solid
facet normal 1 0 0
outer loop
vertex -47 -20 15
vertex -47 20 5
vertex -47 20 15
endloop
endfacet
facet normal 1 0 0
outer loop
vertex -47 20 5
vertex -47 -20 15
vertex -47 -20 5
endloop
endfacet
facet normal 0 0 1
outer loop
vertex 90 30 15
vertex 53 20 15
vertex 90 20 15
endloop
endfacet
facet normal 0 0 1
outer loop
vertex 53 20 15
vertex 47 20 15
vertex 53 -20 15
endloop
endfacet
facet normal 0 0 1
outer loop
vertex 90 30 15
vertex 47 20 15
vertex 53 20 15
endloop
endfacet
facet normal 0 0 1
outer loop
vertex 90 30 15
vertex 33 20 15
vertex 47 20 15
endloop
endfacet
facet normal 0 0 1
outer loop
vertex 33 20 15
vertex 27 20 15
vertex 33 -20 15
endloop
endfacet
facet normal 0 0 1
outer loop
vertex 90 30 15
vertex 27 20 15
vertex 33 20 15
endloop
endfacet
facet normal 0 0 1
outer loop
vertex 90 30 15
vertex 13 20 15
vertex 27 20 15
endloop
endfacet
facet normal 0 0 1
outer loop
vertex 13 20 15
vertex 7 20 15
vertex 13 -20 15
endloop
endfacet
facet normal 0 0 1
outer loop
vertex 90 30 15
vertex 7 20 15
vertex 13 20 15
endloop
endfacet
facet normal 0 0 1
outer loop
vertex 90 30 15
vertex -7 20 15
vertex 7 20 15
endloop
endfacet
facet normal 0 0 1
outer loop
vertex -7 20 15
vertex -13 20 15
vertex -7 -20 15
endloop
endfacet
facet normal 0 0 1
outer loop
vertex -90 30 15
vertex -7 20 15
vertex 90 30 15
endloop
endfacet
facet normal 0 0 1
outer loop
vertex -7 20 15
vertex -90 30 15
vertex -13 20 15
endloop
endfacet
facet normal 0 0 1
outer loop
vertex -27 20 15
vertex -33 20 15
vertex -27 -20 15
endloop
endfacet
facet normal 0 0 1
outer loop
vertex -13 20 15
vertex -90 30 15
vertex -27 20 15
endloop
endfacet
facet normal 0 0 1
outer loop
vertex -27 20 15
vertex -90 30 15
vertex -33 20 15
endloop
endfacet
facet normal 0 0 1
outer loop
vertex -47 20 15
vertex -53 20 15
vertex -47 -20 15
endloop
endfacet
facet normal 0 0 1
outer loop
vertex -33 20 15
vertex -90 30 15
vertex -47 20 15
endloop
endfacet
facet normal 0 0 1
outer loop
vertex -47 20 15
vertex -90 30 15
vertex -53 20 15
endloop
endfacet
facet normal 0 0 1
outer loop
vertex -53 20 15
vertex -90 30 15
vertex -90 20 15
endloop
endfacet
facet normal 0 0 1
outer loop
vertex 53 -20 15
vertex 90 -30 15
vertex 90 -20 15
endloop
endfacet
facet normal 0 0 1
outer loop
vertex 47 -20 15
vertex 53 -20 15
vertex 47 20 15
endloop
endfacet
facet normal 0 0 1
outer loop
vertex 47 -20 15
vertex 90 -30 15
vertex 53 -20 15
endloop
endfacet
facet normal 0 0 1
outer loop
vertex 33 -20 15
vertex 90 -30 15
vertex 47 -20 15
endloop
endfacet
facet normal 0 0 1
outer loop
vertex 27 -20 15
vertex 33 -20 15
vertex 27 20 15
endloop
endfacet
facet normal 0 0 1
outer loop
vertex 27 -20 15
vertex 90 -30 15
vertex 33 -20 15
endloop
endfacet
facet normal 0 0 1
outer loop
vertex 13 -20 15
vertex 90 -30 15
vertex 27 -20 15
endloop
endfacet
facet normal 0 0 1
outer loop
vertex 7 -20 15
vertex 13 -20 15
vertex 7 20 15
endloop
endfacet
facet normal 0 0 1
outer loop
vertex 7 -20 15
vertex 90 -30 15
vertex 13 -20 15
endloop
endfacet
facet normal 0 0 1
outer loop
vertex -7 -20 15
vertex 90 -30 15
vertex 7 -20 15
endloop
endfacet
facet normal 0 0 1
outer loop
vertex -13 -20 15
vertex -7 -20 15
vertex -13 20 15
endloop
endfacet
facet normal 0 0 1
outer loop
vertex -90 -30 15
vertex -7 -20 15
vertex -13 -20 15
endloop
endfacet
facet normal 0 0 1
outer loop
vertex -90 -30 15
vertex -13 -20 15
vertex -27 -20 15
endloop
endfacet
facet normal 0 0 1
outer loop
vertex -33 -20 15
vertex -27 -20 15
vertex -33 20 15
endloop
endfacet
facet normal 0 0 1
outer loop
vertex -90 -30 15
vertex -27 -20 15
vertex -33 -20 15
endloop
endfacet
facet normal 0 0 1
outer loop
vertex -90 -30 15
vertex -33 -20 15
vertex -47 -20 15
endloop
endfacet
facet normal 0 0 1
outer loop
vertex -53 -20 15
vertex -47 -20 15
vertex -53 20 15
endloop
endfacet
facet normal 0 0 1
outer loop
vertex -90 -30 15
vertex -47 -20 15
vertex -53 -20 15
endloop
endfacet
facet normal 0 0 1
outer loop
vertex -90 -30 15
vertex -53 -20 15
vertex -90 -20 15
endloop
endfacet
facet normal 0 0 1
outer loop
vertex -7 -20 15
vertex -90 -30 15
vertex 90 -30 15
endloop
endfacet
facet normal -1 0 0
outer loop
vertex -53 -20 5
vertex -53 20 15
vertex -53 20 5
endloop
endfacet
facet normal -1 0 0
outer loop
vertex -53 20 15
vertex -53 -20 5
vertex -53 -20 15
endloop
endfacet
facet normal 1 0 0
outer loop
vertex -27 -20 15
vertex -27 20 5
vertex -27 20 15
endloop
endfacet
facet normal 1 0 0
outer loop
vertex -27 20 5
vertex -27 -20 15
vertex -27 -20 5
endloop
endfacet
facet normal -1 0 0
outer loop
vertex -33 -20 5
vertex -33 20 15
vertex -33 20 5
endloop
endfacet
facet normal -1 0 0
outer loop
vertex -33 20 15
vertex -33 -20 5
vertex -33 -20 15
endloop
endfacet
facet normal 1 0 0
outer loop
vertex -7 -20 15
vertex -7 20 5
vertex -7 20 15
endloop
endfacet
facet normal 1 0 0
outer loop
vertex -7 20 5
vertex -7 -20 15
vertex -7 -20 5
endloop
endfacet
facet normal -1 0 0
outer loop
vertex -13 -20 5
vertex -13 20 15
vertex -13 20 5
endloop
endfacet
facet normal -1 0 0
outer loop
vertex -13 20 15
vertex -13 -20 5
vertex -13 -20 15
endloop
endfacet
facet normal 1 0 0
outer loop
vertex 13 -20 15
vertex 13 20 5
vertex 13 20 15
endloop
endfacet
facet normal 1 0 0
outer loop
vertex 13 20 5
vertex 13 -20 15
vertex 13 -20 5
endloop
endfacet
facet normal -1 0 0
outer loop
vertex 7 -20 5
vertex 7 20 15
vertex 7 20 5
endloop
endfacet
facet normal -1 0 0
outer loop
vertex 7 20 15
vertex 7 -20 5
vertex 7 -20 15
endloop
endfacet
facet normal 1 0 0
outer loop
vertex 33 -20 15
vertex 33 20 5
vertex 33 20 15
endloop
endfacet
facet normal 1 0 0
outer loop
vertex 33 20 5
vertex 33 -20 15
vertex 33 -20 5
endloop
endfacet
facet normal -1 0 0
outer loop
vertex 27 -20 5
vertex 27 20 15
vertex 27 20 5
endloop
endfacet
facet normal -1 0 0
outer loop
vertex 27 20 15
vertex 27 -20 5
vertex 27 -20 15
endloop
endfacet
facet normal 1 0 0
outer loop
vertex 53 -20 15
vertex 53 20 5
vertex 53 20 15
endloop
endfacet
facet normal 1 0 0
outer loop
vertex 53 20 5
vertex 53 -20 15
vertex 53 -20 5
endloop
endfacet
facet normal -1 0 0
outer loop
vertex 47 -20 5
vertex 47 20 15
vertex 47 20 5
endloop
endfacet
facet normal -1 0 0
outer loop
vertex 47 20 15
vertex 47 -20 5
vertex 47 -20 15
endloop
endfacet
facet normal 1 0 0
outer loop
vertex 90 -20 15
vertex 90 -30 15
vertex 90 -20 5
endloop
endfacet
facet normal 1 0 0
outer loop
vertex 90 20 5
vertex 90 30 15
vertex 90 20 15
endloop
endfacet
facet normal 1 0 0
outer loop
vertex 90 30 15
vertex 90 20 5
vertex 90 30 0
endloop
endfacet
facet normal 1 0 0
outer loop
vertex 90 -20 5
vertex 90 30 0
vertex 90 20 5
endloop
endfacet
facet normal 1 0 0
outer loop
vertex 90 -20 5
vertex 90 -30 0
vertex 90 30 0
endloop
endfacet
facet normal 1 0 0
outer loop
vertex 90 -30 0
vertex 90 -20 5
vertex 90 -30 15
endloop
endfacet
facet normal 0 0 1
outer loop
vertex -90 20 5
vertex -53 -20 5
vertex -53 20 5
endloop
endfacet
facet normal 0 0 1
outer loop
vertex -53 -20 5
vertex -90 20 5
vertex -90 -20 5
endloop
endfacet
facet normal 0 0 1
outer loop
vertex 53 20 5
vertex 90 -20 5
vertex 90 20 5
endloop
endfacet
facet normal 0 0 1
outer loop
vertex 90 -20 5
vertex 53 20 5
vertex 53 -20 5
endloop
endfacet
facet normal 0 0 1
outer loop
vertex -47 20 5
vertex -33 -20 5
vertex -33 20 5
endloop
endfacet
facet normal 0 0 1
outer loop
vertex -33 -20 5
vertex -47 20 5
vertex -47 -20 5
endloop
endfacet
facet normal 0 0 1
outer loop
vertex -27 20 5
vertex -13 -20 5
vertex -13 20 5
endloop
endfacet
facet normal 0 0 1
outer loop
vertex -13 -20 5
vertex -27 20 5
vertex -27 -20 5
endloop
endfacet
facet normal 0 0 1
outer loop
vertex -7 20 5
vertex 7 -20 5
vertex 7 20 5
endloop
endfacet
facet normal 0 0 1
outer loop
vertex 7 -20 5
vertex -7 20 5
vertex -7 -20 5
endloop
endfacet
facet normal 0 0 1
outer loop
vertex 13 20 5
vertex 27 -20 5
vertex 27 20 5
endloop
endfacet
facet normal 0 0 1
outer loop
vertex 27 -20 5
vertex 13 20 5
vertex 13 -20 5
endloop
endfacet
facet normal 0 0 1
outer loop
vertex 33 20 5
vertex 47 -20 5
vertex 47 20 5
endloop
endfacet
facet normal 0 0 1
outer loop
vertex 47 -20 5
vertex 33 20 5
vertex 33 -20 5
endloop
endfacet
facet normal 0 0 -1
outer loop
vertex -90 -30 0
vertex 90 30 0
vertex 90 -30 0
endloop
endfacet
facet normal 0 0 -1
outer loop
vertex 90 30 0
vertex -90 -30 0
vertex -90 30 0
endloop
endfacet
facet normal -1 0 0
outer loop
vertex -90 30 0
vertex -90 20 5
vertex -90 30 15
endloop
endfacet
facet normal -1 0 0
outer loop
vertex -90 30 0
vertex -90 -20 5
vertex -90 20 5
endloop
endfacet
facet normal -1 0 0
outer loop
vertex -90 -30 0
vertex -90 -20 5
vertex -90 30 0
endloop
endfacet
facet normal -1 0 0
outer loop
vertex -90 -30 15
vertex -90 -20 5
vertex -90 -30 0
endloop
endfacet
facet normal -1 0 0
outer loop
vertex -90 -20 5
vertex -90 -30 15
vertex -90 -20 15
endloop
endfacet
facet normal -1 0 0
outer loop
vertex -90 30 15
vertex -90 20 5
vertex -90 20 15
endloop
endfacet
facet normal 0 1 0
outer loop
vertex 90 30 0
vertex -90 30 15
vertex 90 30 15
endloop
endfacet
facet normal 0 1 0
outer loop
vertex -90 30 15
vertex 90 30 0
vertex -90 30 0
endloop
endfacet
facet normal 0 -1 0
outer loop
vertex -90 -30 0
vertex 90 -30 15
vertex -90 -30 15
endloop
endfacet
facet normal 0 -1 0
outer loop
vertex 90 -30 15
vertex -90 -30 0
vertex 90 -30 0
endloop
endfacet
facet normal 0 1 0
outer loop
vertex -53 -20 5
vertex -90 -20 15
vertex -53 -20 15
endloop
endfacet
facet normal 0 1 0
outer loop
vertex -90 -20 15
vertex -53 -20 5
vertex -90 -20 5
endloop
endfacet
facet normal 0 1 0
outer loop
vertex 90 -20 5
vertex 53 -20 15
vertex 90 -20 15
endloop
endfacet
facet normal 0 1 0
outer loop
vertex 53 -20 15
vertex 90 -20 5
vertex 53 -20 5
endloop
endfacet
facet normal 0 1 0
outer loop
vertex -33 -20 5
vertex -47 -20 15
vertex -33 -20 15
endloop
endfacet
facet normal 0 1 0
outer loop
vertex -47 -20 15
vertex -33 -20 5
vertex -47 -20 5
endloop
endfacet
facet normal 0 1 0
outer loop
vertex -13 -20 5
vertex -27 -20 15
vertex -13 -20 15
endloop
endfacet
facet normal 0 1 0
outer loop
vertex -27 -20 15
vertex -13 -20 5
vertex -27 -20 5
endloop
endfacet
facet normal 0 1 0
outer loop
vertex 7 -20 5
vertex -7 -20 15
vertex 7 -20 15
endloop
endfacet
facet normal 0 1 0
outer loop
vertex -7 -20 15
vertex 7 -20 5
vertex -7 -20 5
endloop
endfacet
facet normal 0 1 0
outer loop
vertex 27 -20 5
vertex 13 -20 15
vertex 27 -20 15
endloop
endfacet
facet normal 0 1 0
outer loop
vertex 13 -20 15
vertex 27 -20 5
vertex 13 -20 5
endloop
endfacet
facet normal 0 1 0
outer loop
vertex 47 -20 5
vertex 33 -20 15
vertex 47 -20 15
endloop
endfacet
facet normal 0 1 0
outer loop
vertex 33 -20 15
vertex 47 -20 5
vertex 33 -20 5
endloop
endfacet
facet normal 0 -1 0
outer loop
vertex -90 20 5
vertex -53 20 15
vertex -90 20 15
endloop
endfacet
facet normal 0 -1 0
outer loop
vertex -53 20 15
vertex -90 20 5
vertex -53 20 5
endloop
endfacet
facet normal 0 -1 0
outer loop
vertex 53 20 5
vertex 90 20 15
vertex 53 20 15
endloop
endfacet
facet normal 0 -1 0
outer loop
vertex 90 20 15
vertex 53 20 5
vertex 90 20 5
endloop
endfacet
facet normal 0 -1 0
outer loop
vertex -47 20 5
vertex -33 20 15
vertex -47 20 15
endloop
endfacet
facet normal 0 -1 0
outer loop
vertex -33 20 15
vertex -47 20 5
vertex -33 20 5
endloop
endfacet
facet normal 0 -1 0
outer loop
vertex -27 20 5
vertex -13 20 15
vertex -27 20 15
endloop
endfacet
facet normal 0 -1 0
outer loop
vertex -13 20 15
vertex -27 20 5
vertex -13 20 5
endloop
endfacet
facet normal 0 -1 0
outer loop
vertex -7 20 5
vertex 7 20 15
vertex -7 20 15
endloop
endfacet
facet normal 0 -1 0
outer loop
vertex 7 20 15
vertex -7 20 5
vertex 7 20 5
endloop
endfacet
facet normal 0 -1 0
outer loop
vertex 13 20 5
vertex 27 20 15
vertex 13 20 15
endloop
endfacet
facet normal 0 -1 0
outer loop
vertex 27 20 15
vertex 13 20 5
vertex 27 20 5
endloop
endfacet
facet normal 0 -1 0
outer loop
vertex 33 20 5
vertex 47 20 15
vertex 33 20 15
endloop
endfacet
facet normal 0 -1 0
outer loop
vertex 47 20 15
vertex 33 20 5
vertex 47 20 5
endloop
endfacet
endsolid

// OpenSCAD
$fn = 32;

// ----------------------------------------------------------------------
// Rib frame 180 x 60 x 15
// 6 ribs at 20 mm pitch
// ----------------------------------------------------------------------

// --- parameters (mm) ---
frame = [180, 60, 5];  // base plate size (x, y, z)
rail_w = 10;           // side rail width
ribs = 6;              // number of ribs
rib_t = 6;             // rib thickness
rib_h = 10;            // rib height above the base plate
pitch = 20;            // pitch between rib centres

// --- derived feature positions (mm) ---
span = (ribs - 1) * pitch;          // = 100   distance between the outer ribs
origin_x = -span / 2;               // = -50   X of the first rib
rib_len = frame[1] - 2 * rail_w + 2;  // = 42   rib length, 1 mm into each rail
feature_centers = [
  [origin_x + 0 * pitch, 0],
  [origin_x + 1 * pitch, 0],
  [origin_x + 2 * pitch, 0],
  [origin_x + 3 * pitch, 0],
  [origin_x + 4 * pitch, 0],
  [origin_x + 5 * pitch, 0]
];   // rib centre line, drives the rib loop

// base plate, two side rails, then the ribs read straight off feature_centers
union() {
  translate([-frame[0] / 2, -frame[1] / 2, 0]) cube(frame);
  translate([-frame[0] / 2, -frame[1] / 2, 0]) cube([frame[0], rail_w, frame[2] + rib_h]);
  translate([-frame[0] / 2, frame[1] / 2 - rail_w, 0]) cube([frame[0], rail_w, frame[2] + rib_h]);
  for (centre = feature_centers)
    translate([centre[0] - rib_t / 2, centre[1] - rib_len / 2, frame[2] - 1])
      cube([rib_t, rib_len, rib_h + 1]);
}
